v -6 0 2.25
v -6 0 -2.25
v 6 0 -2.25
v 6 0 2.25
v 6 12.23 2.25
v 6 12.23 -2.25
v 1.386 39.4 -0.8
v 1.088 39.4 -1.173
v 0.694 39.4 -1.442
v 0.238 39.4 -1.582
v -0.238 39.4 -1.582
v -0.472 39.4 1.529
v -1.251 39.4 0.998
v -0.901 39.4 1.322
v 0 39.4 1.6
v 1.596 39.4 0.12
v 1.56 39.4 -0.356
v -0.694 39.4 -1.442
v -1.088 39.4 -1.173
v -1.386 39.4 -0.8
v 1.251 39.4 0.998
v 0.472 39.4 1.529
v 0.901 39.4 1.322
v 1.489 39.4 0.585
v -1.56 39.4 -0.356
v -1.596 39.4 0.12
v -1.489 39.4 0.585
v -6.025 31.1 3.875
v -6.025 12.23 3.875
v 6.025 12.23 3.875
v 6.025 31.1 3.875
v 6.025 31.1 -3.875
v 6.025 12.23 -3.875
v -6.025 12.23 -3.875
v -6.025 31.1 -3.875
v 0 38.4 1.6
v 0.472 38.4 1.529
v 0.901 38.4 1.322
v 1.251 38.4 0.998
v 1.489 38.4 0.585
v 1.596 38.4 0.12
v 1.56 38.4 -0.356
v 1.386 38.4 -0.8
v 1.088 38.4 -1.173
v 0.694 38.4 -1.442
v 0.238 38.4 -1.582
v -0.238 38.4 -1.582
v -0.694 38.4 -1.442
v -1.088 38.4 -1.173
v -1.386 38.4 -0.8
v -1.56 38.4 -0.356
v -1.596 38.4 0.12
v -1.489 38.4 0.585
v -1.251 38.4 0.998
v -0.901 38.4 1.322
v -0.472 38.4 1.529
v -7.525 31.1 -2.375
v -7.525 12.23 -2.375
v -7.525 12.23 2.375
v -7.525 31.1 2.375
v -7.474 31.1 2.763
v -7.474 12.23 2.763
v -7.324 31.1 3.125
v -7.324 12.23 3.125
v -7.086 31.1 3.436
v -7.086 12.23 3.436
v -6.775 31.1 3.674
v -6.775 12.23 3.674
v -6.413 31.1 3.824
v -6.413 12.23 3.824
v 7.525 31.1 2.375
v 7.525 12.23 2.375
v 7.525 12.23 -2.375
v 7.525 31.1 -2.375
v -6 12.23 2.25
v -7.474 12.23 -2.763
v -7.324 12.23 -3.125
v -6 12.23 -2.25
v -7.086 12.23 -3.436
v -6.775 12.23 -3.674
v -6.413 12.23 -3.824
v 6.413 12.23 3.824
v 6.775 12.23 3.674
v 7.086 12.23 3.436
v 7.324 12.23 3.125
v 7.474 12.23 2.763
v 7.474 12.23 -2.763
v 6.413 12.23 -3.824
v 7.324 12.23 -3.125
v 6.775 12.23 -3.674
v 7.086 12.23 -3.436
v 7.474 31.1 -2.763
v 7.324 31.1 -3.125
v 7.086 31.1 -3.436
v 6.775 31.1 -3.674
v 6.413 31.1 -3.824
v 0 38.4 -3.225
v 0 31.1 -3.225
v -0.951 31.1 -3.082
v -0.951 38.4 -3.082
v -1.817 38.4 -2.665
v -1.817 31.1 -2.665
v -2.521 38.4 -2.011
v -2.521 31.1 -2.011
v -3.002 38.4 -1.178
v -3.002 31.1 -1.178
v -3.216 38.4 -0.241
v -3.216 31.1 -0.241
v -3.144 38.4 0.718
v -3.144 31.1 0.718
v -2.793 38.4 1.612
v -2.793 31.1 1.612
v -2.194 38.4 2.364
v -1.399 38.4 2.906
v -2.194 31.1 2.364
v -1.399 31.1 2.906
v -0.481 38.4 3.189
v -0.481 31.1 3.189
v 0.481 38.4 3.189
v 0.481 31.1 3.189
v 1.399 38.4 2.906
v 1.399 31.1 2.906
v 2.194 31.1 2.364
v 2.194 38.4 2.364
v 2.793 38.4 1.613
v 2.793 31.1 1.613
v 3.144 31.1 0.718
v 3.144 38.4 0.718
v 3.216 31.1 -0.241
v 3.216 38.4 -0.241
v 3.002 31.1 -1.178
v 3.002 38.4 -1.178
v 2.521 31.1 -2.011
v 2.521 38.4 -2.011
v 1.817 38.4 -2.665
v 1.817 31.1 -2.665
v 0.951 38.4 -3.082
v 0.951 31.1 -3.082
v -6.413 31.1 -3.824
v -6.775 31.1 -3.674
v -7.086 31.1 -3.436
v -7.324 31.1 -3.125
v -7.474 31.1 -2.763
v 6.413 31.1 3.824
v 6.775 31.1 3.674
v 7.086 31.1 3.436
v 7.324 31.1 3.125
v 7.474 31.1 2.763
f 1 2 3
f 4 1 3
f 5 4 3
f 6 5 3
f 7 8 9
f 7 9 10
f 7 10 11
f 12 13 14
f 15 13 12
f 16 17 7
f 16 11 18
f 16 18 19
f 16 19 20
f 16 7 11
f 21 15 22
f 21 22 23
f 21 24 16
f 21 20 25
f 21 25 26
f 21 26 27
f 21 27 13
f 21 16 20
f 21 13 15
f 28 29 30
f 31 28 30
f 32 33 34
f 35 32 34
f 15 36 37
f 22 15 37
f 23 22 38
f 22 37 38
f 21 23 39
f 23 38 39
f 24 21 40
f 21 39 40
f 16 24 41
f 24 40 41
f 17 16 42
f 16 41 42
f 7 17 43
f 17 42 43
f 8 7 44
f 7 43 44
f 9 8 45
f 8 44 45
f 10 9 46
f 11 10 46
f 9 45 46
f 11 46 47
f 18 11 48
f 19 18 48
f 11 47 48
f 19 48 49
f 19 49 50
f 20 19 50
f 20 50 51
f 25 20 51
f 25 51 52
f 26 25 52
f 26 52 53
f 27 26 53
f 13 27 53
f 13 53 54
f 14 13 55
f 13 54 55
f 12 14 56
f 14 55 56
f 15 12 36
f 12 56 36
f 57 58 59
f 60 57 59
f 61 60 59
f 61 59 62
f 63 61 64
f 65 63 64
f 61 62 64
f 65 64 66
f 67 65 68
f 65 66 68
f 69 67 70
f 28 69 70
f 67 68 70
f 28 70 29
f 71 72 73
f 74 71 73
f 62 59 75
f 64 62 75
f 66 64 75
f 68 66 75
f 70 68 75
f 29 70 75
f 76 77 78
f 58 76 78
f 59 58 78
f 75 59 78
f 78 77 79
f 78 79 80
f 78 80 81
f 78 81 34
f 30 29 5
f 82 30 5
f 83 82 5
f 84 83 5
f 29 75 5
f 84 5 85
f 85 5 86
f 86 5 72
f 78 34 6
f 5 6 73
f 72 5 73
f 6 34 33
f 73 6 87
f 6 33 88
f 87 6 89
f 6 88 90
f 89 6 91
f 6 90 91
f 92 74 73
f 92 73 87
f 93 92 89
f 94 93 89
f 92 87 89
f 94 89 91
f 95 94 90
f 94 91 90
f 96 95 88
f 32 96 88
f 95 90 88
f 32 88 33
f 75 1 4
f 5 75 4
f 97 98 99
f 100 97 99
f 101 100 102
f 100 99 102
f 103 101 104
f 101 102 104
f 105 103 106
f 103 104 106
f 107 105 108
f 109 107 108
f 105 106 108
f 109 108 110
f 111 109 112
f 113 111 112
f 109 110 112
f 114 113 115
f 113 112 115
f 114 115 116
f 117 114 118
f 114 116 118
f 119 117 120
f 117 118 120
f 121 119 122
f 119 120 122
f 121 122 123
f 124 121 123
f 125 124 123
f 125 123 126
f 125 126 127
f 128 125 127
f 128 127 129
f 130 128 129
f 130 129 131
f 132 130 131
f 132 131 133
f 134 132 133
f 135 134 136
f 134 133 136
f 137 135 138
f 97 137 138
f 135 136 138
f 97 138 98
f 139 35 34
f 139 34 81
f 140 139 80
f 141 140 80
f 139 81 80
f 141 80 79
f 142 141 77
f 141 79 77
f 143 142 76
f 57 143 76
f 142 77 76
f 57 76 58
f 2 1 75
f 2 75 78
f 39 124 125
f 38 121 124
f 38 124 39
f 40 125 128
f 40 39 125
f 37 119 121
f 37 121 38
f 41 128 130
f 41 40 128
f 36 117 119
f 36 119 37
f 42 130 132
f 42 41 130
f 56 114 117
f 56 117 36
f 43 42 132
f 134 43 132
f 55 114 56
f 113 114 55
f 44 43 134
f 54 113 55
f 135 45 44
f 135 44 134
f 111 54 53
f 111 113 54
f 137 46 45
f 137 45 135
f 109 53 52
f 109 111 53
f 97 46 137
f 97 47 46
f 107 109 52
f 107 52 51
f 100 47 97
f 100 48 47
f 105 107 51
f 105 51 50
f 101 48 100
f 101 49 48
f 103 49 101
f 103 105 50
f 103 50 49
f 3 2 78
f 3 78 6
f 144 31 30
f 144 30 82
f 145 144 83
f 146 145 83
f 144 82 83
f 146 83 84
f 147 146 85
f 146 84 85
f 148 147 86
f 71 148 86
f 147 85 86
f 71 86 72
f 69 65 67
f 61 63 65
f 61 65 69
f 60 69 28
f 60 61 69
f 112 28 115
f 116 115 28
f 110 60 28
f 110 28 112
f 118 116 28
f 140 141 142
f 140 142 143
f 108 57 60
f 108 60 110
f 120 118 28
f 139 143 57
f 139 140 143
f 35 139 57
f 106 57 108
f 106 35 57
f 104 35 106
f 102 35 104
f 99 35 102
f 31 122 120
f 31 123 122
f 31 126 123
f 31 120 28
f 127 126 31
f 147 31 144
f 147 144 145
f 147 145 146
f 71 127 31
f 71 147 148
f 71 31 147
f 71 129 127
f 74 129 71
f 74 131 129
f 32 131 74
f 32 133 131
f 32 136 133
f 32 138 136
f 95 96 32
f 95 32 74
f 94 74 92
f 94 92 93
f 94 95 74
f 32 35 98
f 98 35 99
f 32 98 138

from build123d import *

# Parameters (mm, degrees)
SKETCH1_W           = 12
SKETCH1_H           = 4.5
BOSS_EXTRUDE1_DEPTH = 12.23
BOSS_EXTRUDE2_DEPTH = 18.87
SKETCH3_R           = 3.225
BOSS_EXTRUDE3_DEPTH = 7.3
SKETCH4_R           = 1.6
BOSS_EXTRUDE4_DEPTH = 1


with BuildPart() as part:
    # Sketch1 → Boss-Extrude1 (new body)
    with BuildSketch(Plane(origin=(0, 0, 0), x_dir=(1, 0, 0), z_dir=(0, 1, 0))):
        Rectangle(SKETCH1_W, SKETCH1_H)
    extrude(amount=BOSS_EXTRUDE1_DEPTH)

    # Sketch2 → Boss-Extrude2 (add)
    with BuildSketch(Plane(origin=(0, 12.23, 0), x_dir=(1, 0, 0), z_dir=(0, 1, 0))):
        with BuildLine():
            Line((-6.025, -3.875), (6.025, -3.875))
            ThreePointArc((6.025, -3.875), (7.085660172, -3.435660172), (7.525, -2.375))
            Line((7.525, -2.375), (7.525, 2.375))
            ThreePointArc((7.525, 2.375), (7.085660172, 3.435660172), (6.025, 3.875))
            Line((6.025, 3.875), (-6.025, 3.875))
            ThreePointArc((-6.025, 3.875), (-7.085660172, 3.435660172), (-7.525, 2.375))
            Line((-7.525, 2.375), (-7.525, -2.375))
            ThreePointArc((-7.525, -2.375), (-7.085660172, -3.435660172), (-6.025, -3.875))
        make_face()
    extrude(amount=BOSS_EXTRUDE2_DEPTH)

    # Sketch3 → Boss-Extrude3 (add)
    with BuildSketch(Plane(origin=(0, 31.1, 0), x_dir=(1, 0, 0), z_dir=(0, 1, 0))):
        with Locations(Location((0, 0, 0), (0, 0, 90))):
            Circle(SKETCH3_R)
    extrude(amount=BOSS_EXTRUDE3_DEPTH)

    # Sketch4 → Boss-Extrude4 (add)
    with BuildSketch(Plane(origin=(0, 38.4, 0), x_dir=(1, 0, 0), z_dir=(0, 1, 0))):
        with Locations(Location((0, 0, 0), (0, 0, 270))):
            Circle(SKETCH4_R)
    extrude(amount=BOSS_EXTRUDE4_DEPTH)


solid = part.part
